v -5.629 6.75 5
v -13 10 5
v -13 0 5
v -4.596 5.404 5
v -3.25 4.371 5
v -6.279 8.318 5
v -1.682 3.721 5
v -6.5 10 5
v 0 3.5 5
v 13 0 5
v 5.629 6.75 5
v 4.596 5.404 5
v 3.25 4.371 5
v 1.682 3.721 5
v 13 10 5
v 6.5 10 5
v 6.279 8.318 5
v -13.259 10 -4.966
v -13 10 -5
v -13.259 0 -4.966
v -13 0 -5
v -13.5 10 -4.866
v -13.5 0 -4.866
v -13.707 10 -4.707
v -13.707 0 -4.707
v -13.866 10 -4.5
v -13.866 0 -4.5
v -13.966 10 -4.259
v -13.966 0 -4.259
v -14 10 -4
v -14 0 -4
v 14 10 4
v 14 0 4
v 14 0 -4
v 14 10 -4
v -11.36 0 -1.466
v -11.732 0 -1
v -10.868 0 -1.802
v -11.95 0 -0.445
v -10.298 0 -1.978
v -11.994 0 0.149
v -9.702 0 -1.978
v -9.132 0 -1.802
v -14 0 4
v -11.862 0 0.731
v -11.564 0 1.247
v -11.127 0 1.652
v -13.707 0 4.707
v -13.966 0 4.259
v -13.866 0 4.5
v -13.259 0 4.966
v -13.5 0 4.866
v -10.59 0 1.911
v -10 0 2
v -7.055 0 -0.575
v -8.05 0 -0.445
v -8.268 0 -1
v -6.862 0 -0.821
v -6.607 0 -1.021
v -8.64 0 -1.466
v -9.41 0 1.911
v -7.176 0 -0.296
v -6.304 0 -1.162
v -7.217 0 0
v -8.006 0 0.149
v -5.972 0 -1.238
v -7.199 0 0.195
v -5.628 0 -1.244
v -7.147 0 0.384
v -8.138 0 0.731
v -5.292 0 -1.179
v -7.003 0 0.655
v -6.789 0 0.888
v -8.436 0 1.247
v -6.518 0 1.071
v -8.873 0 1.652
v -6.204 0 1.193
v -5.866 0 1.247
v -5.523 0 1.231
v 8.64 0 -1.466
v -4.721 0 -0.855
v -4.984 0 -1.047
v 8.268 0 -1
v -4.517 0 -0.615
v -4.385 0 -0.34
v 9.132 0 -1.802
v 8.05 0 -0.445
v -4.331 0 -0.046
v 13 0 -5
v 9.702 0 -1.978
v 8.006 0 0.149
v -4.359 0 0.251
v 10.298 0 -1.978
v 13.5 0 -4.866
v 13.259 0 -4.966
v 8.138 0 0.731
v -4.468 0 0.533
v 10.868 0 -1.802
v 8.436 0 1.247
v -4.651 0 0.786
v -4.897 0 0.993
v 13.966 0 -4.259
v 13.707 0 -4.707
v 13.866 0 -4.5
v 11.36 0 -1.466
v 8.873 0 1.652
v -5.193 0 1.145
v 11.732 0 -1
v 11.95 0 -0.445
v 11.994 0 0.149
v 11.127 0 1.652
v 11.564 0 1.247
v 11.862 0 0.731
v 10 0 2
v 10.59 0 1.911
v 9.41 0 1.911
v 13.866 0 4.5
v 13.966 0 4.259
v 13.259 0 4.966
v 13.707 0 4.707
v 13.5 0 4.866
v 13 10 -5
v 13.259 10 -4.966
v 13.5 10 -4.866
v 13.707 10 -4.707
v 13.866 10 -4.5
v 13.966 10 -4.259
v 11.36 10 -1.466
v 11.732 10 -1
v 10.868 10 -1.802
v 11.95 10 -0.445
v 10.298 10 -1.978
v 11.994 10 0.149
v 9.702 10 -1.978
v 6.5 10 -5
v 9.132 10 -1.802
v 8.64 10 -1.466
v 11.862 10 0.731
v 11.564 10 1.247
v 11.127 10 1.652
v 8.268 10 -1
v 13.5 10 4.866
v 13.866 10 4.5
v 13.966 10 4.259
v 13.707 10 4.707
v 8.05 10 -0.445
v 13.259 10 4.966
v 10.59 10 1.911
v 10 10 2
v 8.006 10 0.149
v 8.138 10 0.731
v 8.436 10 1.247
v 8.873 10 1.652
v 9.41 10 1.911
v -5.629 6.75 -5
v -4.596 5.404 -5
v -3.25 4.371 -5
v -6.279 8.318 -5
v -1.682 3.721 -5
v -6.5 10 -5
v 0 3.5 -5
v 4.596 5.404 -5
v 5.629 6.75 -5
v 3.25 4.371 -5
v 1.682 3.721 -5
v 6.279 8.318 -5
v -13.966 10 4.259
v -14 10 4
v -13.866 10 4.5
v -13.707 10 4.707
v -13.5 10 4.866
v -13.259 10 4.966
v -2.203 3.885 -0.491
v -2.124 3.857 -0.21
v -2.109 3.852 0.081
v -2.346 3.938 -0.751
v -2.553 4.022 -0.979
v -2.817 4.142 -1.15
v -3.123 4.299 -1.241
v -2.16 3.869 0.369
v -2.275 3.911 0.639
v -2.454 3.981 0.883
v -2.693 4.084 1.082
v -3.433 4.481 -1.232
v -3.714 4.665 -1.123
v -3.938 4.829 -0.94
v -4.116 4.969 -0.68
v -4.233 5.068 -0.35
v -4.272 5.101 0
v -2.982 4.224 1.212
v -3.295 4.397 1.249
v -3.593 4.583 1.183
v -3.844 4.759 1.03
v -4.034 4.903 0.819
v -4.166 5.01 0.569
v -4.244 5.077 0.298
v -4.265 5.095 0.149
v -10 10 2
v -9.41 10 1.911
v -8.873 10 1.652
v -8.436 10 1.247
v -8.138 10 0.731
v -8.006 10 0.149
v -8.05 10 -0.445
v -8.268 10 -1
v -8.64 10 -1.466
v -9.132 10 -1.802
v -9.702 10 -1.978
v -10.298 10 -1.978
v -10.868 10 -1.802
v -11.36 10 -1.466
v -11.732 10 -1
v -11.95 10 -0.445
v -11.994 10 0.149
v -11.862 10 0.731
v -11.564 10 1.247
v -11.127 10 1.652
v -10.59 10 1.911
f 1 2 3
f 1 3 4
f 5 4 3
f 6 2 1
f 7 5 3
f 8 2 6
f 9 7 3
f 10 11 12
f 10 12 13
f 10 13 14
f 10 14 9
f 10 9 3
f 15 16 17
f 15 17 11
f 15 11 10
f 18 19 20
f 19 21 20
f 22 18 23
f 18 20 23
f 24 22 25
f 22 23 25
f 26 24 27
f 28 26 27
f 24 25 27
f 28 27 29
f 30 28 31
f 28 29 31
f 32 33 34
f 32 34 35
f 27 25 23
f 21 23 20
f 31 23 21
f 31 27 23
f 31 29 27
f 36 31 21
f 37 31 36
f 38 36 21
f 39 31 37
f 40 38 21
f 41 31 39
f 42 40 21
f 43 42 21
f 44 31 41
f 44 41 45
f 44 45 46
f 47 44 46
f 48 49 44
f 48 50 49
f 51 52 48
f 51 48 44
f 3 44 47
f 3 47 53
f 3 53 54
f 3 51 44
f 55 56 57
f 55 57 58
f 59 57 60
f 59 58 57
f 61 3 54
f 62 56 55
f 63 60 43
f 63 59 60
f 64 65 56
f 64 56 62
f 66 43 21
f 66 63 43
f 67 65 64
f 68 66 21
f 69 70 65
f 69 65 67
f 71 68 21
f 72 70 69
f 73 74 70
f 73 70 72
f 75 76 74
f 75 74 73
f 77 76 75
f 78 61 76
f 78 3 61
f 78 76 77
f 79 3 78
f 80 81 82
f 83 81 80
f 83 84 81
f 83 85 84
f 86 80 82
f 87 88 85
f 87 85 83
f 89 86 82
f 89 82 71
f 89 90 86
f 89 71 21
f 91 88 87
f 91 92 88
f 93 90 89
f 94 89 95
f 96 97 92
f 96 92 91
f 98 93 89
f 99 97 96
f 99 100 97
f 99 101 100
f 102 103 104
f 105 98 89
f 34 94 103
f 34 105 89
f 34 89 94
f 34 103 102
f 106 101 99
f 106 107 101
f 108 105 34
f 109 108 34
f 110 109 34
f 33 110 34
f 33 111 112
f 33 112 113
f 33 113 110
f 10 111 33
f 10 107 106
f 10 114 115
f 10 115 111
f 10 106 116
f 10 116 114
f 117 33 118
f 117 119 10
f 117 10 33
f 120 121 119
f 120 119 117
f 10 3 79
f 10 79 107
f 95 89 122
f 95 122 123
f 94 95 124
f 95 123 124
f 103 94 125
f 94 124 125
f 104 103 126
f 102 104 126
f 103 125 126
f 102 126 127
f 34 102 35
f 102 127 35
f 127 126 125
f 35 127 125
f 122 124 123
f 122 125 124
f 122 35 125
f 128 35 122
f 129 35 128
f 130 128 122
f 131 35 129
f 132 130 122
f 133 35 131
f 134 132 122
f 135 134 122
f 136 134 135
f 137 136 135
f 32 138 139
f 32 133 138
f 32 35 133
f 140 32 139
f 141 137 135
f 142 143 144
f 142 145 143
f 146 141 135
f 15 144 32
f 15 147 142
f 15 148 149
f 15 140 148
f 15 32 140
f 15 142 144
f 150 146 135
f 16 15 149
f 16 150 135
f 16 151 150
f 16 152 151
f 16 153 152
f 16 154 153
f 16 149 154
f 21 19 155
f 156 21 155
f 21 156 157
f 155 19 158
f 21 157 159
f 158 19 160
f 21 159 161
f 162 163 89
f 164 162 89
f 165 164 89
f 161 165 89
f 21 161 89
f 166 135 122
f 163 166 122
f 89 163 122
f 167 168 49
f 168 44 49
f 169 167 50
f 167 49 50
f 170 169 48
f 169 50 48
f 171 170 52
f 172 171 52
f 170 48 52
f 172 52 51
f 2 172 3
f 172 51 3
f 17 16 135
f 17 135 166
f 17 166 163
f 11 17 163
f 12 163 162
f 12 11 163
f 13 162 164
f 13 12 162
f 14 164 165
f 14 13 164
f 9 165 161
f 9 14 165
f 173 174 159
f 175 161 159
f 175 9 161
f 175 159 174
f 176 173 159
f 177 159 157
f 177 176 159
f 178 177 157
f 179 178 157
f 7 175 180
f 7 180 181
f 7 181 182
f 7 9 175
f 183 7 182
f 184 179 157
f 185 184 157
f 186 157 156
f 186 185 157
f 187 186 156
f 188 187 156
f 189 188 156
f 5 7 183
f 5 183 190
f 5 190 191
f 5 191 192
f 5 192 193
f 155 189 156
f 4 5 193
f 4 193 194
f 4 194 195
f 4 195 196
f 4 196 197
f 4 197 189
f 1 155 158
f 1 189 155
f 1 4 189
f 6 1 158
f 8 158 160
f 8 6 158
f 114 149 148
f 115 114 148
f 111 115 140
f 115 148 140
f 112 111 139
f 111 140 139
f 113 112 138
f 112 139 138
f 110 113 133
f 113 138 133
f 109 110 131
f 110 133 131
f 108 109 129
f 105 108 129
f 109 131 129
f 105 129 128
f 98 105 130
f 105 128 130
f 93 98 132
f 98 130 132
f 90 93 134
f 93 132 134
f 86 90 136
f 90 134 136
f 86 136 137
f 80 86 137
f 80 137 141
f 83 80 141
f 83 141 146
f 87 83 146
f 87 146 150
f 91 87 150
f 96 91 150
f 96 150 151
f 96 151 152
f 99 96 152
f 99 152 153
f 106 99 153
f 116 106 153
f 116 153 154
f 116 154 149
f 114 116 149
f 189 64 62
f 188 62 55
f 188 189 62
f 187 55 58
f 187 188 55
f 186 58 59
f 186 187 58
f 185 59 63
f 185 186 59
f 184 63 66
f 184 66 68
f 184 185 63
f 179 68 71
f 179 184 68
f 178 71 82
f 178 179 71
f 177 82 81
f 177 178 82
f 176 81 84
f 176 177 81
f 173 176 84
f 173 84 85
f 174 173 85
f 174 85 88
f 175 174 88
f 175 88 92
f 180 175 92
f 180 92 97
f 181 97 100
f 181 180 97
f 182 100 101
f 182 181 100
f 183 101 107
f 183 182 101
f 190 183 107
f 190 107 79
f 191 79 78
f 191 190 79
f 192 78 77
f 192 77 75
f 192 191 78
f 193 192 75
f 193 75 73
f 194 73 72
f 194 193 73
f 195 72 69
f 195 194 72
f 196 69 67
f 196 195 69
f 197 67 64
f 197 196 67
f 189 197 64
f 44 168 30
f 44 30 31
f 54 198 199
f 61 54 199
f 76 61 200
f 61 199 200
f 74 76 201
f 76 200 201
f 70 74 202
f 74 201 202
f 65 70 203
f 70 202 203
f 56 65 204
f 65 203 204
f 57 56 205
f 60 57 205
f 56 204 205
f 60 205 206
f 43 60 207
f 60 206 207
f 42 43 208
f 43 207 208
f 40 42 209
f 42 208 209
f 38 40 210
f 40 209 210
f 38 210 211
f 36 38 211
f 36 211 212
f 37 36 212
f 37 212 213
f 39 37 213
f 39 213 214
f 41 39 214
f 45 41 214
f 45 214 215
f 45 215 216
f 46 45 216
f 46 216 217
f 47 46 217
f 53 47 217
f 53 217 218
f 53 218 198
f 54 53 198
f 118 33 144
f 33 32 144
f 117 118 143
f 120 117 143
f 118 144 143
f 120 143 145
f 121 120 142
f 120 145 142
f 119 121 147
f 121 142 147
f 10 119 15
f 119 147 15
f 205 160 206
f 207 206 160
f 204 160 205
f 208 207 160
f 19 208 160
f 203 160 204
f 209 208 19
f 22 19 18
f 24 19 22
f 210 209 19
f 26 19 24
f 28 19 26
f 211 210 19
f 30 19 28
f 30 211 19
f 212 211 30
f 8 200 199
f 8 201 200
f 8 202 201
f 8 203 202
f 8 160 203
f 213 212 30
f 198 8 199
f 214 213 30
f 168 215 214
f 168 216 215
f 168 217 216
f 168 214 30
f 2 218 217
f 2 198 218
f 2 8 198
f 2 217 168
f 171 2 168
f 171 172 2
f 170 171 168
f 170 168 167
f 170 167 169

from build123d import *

# Parameters (mm, degrees)
BOSS_EXTRUDE1_DEPTH = 5
CUT_EXTRUDE1_REACH  = 19.916
SKETCH4_R           = 2
FILLET1_R           = 1


with BuildPart() as part:
    # Sketch1 → Boss-Extrude1 (new, symmetric)
    with BuildSketch(Plane.XY):
        with BuildLine():
            Line((-14, 0), (14, 0))
            Line((14, 0), (14, 10))
            Line((14, 10), (6.5, 10))
            ThreePointArc((6.5, 10), (0, 3.5), (-6.5, 10))
            Line((-6.5, 10), (-14, 10))
            Line((-14, 10), (-14, 0))
        make_face()
    extrude(amount=BOSS_EXTRUDE1_DEPTH, both=True)

    # Sketch2 → Cut-Revolve2 (revolve, cut)
    with BuildSketch(Plane.XY):
        Polygon((-2.748441557, 5.239559582), (-7.60591541, -3.173831928), (-8.688447164, -2.548831928), (-3.830973311, 5.864559582), align=None)
    revolve(axis=Axis((-2.748441557, 5.239559582, 0), (-0.4999999999999947, -0.8660254037844417, 0)), mode=Mode.SUBTRACT)

    # Sketch4 → Cut-Extrude1 (cut, up to next)
    with BuildSketch(Plane(origin=(0, 10, 0), x_dir=(1, 0, 0), z_dir=(0, 1, 0)), mode=Mode.PRIVATE) as cut_extrude1_sk1:
        with Locations(Location((-10, 0, 0), (0, 0, 270))):
            Circle(SKETCH4_R)
    cut_extrude1_tool1 = extrude(cut_extrude1_sk1.sketch, amount=-CUT_EXTRUDE1_REACH, mode=Mode.PRIVATE) & part.part
    # Sketch4 → Cut-Extrude1 (cut, up to next)
    with BuildSketch(Plane(origin=(0, 10, 0), x_dir=(1, 0, 0), z_dir=(0, 1, 0)), mode=Mode.PRIVATE) as cut_extrude1_sk2:
        with Locations(Location((10, 0, 0), (0, 0, 270))):
            Circle(SKETCH4_R)
    cut_extrude1_tool2 = extrude(cut_extrude1_sk2.sketch, amount=-CUT_EXTRUDE1_REACH, mode=Mode.PRIVATE) & part.part
    add(cut_extrude1_tool1.solids().sort_by_distance((-10, 10, 0))[0], mode=Mode.SUBTRACT)
    add(cut_extrude1_tool2.solids().sort_by_distance((10, 10, 0))[0], mode=Mode.SUBTRACT)

    # Fillet1
    fillet1_edges = [part.edges().sort_by_distance(p)[0] for p in [
        (14, 5, 5),
        (-14, 5, 5),
        (14, 5, -5),
        (-14, 5, -5),
    ]]
    fillet(fillet1_edges, radius=FILLET1_R)


solid = part.part
